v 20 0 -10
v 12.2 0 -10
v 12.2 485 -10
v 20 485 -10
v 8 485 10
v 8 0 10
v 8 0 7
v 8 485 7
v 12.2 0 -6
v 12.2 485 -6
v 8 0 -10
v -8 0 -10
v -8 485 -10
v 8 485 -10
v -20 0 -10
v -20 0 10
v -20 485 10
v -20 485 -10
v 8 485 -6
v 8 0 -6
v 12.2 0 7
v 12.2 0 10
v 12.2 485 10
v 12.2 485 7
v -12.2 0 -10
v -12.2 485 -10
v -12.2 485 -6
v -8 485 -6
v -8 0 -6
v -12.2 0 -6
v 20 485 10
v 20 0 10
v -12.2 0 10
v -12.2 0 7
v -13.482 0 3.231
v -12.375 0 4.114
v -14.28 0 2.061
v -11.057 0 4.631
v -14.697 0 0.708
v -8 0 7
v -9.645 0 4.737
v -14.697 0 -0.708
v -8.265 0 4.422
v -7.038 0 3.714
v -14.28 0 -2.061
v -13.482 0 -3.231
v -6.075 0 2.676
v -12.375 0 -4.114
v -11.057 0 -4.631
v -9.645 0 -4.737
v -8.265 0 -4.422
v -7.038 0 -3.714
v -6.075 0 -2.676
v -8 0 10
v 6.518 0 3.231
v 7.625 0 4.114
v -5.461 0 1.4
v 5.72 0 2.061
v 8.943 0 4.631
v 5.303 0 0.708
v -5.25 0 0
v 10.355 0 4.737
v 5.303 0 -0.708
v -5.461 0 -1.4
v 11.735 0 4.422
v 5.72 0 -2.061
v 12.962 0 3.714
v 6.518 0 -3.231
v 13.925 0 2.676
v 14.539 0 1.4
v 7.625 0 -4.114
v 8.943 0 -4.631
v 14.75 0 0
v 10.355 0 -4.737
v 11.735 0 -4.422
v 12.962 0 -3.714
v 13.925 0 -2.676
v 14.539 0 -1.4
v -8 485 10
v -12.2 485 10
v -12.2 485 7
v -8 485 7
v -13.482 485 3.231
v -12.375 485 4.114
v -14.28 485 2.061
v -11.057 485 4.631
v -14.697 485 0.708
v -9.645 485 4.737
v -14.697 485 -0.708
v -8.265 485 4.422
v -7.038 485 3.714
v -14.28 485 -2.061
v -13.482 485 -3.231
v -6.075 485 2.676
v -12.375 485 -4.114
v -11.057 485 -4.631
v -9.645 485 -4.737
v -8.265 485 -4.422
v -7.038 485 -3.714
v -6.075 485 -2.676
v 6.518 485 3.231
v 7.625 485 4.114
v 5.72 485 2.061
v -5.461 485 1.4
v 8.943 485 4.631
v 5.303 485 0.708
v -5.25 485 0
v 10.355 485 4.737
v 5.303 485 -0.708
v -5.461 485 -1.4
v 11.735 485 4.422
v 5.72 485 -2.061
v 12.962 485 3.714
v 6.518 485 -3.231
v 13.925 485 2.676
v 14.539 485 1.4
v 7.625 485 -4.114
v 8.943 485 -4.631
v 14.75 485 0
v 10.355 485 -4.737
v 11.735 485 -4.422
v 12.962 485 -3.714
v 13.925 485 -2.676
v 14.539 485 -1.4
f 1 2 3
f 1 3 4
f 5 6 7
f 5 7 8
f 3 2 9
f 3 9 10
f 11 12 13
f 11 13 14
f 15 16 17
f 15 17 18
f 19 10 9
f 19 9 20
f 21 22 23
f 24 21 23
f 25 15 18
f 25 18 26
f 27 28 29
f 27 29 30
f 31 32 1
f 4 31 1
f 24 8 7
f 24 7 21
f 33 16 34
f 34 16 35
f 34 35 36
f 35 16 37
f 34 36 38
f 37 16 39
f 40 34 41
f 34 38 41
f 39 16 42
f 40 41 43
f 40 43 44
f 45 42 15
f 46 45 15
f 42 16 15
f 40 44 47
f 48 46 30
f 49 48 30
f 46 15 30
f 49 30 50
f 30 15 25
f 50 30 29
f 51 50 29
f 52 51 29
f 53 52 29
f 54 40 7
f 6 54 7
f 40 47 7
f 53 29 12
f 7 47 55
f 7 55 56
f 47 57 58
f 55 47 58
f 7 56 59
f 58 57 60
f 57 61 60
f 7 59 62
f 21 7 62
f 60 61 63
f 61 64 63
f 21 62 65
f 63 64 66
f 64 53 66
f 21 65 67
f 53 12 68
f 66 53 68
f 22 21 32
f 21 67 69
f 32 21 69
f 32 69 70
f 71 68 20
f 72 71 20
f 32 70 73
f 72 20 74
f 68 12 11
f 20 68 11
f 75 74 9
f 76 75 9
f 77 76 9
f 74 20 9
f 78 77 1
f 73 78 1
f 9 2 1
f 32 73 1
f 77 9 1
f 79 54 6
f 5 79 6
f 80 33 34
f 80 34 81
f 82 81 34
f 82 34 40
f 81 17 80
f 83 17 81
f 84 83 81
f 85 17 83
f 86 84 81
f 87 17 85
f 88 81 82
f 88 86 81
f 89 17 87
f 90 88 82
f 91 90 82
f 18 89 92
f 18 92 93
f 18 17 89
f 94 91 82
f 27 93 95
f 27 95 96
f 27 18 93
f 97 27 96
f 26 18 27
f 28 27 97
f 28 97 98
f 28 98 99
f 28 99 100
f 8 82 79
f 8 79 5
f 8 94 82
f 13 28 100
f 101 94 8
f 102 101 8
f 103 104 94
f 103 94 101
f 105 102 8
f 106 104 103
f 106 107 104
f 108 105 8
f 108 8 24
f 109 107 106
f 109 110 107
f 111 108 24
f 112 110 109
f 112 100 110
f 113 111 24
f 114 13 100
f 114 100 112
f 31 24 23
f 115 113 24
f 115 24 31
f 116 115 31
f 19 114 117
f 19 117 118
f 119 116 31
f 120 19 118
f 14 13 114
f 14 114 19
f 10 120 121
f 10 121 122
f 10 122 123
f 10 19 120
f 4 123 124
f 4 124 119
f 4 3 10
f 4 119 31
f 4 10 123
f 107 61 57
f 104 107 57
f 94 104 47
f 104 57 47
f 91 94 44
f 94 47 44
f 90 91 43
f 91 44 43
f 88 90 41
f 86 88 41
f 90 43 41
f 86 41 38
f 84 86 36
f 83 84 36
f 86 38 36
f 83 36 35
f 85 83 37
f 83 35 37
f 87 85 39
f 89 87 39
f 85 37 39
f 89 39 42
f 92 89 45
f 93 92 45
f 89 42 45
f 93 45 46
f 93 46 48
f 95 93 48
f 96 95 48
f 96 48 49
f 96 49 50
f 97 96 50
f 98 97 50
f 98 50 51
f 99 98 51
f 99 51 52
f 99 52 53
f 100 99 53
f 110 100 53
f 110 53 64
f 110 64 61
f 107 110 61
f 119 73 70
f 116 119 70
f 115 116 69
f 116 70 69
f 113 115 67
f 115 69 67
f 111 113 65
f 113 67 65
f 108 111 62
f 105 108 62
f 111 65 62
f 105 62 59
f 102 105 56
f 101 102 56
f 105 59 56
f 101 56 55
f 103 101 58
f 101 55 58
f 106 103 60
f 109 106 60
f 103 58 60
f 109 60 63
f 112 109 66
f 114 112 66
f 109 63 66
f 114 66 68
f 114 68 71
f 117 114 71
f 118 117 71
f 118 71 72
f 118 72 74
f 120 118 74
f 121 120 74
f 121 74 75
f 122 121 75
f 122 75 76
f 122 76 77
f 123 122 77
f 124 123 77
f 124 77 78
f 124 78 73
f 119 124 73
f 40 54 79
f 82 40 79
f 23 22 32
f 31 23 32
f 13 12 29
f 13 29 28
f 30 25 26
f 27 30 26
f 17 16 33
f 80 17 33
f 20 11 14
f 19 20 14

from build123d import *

# Parameters (mm, degrees)
SKETCH_2_W          = 40
SKETCH_2_H          = 20
EXTRUDE_1_DEPTH     = 485
SKETCH_3_R          = 4.75
CUT_EXTRUDE_1_DEPTH = 486
SKETCH_4_W          = 4.2
SKETCH_4_H          = 485
CUT_EXTRUDE_2_DEPTH = 3
SKETCH_5_W          = 4.2
SKETCH_5_H          = 485
CUT_EXTRUDE_3_DEPTH = 4


with BuildPart() as part:
    # 草图2 → 凸台-拉伸1 (new body)
    with BuildSketch(Plane(origin=(0, 0, 0), x_dir=(1, 0, 0), z_dir=(0, 1, 0))):
        Rectangle(SKETCH_2_W, SKETCH_2_H)
    extrude(amount=EXTRUDE_1_DEPTH)

    # 草图3 → 切除-拉伸1 (cut, through all)
    with BuildSketch(Plane.XZ):
        with Locations((-10, 0)):
            Circle(SKETCH_3_R)
        with Locations((10, 0)):
            Circle(SKETCH_3_R)
    extrude(amount=-CUT_EXTRUDE_1_DEPTH, mode=Mode.SUBTRACT)

    # 草图4 → 切除-拉伸2 (cut)
    with BuildSketch(Plane.XY.offset(10)):
        with Locations((-10.1, 242.5)):
            Rectangle(SKETCH_4_W, SKETCH_4_H)
        with Locations((10.1, 242.5)):
            Rectangle(SKETCH_4_W, SKETCH_4_H)
    extrude(amount=-CUT_EXTRUDE_2_DEPTH, mode=Mode.SUBTRACT)

    # 草图5 → 切除-拉伸3 (cut)
    with BuildSketch(Plane(origin=(0, 0, -10), x_dir=(-1, 0, 0), z_dir=(0, 0, -1))):
        with Locations((-10.1, 242.5)):
            Rectangle(SKETCH_5_W, SKETCH_5_H)
        with Locations((10.1, 242.5)):
            Rectangle(SKETCH_5_W, SKETCH_5_H)
    extrude(amount=-CUT_EXTRUDE_3_DEPTH, mode=Mode.SUBTRACT)


solid = part.part
